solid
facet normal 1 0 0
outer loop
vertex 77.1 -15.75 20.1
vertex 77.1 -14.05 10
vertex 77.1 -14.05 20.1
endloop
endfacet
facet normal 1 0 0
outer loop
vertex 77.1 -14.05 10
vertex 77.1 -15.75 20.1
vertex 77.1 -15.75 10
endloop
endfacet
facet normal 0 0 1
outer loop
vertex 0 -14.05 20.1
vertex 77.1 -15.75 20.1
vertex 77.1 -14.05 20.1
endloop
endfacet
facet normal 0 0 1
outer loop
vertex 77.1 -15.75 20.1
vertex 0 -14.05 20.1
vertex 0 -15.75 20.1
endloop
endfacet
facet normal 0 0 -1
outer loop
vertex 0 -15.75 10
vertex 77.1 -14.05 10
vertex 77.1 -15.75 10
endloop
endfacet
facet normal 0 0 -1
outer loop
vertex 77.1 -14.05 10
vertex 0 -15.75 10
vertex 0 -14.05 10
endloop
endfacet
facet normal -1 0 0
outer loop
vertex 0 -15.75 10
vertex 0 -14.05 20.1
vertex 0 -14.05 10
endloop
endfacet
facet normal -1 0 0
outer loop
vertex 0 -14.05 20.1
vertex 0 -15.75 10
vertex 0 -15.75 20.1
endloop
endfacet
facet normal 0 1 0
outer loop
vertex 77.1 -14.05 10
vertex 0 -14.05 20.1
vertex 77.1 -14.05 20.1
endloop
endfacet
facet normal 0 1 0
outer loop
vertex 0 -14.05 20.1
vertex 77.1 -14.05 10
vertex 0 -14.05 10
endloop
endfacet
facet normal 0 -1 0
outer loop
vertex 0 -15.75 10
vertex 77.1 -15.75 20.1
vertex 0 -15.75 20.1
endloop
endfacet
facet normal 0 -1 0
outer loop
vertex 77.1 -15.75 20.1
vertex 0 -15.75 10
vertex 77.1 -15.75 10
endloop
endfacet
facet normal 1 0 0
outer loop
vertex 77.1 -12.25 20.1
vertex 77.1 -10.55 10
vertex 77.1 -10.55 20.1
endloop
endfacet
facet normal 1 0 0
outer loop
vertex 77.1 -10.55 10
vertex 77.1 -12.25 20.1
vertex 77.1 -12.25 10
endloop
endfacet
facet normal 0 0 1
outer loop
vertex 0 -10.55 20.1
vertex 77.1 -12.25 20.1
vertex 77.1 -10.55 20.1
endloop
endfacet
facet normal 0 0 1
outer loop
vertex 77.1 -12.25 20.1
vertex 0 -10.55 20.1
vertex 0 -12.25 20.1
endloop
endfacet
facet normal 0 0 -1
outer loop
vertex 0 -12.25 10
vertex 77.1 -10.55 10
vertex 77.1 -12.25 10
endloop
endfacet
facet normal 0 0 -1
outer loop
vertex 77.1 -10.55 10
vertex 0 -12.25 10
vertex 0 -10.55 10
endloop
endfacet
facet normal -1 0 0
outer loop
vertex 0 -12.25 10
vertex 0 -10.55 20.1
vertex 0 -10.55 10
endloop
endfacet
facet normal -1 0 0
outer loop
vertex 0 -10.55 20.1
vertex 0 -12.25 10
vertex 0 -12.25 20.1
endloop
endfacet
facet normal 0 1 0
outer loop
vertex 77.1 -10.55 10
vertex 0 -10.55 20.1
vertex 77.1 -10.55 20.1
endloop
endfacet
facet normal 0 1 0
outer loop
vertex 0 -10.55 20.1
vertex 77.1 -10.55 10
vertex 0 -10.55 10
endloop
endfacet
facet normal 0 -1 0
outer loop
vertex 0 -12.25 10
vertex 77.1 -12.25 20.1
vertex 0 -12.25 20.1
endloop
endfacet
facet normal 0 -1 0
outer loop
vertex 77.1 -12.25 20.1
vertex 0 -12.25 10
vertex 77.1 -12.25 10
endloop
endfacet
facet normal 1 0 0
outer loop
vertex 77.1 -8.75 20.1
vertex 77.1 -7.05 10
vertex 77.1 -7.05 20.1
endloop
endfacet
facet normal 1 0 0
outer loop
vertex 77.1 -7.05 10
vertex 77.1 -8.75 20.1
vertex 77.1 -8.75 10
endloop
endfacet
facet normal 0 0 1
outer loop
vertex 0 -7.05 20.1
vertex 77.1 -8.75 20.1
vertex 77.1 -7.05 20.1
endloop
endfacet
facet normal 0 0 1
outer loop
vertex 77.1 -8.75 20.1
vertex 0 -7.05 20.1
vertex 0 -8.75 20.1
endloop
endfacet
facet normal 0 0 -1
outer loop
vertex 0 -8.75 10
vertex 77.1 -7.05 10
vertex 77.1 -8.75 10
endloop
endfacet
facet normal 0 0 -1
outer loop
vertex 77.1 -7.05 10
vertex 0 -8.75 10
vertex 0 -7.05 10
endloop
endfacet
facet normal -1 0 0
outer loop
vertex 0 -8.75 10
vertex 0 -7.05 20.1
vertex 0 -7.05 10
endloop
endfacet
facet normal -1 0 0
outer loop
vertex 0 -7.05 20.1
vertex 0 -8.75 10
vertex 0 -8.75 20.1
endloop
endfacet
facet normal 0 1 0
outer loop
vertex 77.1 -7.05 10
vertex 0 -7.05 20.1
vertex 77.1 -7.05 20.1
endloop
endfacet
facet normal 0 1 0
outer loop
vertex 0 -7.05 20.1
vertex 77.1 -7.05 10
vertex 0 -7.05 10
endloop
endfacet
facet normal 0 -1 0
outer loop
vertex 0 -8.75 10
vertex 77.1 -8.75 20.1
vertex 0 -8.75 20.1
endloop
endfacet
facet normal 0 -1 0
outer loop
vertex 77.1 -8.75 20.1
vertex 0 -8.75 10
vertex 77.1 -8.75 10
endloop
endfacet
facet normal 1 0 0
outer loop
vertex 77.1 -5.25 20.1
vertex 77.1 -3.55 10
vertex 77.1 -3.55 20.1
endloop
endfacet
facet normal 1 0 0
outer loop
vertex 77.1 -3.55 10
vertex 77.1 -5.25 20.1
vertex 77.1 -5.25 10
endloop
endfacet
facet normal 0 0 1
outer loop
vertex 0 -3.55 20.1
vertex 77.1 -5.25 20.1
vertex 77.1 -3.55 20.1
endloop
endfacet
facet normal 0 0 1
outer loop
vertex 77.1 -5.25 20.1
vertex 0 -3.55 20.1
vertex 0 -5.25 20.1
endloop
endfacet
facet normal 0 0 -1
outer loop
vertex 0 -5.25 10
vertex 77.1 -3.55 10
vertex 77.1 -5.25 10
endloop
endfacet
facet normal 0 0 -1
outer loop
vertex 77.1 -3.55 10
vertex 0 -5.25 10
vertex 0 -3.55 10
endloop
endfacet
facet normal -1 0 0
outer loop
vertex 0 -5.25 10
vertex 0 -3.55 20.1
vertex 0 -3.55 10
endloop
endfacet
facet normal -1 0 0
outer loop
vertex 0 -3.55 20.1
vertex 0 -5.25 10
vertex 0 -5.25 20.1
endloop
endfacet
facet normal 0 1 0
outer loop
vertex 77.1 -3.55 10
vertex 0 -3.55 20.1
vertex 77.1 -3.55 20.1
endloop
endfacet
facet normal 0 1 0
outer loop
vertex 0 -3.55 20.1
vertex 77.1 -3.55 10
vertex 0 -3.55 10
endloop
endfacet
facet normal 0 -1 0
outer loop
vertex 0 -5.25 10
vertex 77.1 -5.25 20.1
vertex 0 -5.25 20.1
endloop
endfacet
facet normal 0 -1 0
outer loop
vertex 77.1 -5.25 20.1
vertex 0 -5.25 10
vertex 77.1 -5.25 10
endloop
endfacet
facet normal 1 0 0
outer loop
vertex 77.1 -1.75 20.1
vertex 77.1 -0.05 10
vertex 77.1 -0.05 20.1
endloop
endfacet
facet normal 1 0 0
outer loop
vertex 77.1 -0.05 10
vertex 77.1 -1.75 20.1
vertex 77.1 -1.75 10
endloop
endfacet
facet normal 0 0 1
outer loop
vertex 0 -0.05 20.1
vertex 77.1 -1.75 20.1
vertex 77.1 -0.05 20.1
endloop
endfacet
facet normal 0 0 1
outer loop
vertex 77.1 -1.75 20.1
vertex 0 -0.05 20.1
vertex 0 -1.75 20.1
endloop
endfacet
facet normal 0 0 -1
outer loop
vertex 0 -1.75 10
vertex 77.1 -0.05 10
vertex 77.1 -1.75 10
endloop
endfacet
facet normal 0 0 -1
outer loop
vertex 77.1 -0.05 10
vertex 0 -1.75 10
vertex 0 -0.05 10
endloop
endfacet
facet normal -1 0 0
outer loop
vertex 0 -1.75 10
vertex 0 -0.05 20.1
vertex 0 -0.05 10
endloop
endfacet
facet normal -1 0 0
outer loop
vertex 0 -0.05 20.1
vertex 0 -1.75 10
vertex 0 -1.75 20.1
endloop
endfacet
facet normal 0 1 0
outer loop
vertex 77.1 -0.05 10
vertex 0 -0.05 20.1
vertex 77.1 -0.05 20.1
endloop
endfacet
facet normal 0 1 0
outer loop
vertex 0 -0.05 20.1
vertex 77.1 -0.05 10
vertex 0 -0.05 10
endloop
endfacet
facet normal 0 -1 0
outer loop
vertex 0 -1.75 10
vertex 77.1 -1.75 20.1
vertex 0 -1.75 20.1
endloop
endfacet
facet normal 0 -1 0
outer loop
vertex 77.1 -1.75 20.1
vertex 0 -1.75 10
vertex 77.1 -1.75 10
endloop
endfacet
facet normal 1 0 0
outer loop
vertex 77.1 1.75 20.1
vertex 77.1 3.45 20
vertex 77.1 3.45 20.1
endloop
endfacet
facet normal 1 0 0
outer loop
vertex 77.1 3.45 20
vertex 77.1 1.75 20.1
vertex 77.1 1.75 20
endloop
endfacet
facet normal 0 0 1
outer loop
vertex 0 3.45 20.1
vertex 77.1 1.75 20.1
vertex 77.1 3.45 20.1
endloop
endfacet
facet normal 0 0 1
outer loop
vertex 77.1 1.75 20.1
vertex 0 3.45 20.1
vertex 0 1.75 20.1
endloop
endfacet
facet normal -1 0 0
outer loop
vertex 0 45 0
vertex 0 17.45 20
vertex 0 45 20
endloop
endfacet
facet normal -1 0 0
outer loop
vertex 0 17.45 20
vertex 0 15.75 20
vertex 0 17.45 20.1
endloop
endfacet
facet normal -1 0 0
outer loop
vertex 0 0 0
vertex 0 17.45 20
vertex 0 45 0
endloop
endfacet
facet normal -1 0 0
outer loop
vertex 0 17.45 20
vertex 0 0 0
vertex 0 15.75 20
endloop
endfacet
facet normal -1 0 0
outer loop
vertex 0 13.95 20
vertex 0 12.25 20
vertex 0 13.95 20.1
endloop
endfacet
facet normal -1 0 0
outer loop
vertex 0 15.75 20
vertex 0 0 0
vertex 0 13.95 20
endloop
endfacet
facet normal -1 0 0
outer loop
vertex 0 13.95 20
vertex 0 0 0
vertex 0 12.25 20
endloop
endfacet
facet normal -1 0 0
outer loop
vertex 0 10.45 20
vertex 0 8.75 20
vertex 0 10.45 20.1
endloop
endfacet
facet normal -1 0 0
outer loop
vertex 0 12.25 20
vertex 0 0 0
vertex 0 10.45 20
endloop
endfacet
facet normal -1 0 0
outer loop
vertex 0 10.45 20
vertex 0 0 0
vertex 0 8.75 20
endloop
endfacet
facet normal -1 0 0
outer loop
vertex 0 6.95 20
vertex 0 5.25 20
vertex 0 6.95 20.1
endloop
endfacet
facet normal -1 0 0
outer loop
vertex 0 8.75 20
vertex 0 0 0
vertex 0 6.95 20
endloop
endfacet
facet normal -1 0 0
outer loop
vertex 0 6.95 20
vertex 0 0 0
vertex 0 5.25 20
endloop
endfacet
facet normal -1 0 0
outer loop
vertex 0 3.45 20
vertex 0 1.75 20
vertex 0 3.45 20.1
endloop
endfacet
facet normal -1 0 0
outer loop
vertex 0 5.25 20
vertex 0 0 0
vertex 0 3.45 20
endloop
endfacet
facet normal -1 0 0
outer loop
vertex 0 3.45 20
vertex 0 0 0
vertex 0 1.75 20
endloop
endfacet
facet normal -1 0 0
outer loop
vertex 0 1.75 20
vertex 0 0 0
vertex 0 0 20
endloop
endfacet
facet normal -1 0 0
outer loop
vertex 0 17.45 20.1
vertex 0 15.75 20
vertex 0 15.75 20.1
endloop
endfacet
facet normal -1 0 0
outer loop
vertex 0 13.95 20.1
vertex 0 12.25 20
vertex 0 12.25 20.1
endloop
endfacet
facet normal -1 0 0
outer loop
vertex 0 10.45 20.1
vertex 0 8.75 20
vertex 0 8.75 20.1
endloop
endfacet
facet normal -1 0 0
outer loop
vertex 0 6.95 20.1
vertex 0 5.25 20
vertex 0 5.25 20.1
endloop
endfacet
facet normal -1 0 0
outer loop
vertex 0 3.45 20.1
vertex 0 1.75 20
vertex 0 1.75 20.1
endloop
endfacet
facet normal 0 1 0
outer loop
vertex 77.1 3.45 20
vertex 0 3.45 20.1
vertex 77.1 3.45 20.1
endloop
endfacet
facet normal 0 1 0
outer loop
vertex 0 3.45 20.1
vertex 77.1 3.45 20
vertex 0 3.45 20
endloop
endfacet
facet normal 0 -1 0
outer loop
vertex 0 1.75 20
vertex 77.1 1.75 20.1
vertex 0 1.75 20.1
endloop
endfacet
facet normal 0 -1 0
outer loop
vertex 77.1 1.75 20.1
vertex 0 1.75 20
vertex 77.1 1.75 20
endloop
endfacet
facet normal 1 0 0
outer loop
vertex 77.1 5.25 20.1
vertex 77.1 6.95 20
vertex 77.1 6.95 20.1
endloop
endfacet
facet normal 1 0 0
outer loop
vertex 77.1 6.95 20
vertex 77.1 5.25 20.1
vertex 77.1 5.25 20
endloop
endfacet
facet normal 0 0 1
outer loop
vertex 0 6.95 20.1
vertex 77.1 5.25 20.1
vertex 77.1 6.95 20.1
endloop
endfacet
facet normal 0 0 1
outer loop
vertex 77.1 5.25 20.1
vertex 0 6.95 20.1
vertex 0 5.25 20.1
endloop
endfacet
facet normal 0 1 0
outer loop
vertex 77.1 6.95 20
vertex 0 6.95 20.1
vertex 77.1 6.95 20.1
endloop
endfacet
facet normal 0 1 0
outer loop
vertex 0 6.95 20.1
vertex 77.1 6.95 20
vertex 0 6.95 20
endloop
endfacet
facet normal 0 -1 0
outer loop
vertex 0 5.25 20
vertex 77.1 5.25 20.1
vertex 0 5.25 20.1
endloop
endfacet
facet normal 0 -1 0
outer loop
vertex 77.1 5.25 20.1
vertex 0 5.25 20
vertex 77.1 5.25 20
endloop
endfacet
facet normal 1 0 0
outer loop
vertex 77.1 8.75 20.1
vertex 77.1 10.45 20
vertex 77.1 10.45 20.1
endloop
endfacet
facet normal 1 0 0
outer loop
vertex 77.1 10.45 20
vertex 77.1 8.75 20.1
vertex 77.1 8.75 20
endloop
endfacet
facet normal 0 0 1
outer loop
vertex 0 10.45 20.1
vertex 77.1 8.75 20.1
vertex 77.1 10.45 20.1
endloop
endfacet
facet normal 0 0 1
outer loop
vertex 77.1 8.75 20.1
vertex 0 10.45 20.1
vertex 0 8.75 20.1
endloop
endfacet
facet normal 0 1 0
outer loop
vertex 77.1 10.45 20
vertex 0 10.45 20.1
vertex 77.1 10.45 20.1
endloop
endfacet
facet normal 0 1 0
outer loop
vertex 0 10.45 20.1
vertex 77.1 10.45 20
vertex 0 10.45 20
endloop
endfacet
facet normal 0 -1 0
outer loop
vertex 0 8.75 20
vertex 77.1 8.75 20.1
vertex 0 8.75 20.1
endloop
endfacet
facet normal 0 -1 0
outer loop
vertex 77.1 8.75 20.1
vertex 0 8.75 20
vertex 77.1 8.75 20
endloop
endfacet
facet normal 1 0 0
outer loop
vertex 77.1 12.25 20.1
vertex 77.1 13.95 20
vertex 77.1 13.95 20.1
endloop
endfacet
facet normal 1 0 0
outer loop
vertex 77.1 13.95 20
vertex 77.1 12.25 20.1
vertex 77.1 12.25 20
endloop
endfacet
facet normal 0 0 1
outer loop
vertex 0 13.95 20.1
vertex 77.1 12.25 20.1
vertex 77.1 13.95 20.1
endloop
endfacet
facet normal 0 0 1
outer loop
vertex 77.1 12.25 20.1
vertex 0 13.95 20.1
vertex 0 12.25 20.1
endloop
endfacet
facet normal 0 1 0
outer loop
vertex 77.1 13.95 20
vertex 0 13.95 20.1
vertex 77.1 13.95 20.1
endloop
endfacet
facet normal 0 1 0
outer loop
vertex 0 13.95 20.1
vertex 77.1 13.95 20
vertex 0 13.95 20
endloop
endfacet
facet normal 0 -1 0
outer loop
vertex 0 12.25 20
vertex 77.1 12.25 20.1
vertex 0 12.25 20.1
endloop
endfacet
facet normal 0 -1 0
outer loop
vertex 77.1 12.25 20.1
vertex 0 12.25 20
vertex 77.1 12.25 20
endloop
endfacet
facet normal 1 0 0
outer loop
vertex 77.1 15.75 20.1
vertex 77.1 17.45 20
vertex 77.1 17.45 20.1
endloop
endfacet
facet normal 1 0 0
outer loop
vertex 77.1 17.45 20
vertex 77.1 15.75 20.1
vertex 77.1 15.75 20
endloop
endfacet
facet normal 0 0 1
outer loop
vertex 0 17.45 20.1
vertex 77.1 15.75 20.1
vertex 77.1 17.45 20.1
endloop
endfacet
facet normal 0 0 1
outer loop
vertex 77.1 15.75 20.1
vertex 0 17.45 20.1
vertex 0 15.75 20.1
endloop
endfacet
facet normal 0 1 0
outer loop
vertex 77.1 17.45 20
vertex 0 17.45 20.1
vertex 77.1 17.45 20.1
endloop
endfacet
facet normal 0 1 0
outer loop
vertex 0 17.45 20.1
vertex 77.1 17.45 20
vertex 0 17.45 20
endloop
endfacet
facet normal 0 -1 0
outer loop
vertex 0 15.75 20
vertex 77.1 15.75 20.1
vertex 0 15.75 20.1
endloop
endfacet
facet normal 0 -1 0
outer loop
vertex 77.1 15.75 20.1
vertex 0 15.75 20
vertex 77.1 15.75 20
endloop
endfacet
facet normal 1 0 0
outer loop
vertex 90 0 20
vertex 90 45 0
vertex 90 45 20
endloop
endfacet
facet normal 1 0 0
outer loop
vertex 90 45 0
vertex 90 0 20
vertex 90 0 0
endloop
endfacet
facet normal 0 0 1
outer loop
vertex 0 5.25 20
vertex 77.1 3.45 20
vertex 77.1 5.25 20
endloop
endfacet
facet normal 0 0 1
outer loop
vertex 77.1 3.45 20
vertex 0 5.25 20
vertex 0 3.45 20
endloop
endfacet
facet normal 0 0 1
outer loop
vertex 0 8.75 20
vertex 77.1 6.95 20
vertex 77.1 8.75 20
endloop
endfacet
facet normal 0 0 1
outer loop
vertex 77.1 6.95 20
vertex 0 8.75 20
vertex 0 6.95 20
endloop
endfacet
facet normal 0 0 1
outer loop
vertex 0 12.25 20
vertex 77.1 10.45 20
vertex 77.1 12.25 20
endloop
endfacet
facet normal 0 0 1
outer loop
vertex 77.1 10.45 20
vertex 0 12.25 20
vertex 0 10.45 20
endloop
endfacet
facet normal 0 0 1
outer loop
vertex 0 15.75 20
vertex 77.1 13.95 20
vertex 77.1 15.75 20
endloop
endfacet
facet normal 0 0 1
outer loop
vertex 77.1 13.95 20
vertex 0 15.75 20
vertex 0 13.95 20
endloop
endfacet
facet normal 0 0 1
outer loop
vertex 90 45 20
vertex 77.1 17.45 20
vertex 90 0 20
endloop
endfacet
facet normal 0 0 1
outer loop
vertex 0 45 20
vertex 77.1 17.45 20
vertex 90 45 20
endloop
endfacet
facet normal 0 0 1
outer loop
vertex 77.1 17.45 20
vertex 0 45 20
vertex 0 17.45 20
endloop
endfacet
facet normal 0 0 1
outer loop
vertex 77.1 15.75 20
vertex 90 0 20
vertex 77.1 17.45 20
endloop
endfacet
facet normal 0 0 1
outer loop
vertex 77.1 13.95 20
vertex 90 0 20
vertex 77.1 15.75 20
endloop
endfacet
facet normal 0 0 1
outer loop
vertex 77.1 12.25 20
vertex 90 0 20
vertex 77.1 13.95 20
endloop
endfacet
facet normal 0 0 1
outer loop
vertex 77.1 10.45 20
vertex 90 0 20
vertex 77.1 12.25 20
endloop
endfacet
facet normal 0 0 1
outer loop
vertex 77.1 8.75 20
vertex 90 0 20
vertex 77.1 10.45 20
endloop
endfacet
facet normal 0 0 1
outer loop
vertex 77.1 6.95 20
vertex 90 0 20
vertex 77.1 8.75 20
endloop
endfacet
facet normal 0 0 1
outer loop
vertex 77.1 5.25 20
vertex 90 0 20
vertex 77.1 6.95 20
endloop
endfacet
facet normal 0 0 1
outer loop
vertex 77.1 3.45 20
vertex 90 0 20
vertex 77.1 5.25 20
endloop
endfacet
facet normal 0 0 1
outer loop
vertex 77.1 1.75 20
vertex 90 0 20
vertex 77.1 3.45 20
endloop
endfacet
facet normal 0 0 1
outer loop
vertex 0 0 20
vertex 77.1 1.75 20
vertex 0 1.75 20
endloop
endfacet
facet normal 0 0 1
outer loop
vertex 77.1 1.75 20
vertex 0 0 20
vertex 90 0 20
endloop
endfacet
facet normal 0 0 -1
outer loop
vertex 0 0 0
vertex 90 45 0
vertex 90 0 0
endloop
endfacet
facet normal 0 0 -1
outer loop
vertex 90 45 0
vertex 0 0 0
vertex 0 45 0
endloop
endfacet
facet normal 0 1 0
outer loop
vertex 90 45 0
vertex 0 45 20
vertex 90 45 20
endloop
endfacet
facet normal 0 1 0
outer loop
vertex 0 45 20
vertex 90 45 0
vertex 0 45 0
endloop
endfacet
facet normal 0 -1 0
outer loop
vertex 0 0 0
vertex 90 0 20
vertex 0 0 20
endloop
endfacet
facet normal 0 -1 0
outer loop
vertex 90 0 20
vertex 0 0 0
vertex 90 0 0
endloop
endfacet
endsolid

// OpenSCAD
// Drying Rack for 10 Microscope Slides
// Base: 90 x 45 x 20 mm
// Slots: 10 parallel slots, 77mm long, 1.6mm wide, 10mm deep
// Spacing: 3.5mm centre-to-centre (Y)
// Orientation: Rests on XY plane at Z=0, builds upward (+Z)

// Base Dimensions
$base_length = 90;
$base_width = 45;
$base_height = 20;

// Slide Dimensions (for reference)
$slide_length = 75;
$slide_width = 25;
$slide_thickness = 1;

// Slot Dimensions
$num_slots = 10;
$slot_length = 77;
$slot_width = 1.6;
$slot_depth = 10;
$slot_spacing = 3.5; // Centre-to-centre in Y

// Extrusion quality for curved/rounded features
$fn = 64;

// Calculate slot positions
// The group of slots is centred on the block in X and Y.
// Since slots run along X, their X position is fixed at the center of the block.
// Their Y positions are calculated based on the total width and spacing.

// Total width occupied by the slots + gaps
// We need to center the entire array of 10 slots within the base width ($base_width).
// The distance from the center of the first slot to the center of the last slot is:
// (num_slots - 1) * slot_spacing
$offset_from_center = (($num_slots - 1) * $slot_spacing) / 2;

// Generate Y positions for the slots
// We iterate from -offset to +offset
for (i = [0 : $num_slots - 1]) {
    $y_pos = -($offset_from_center) + (i * $slot_spacing);
    
    // Define the slot geometry
    // The slot is a rectangular prism cut into the top face.
    // It runs along X (length $slot_length), is wide in Y ($slot_width), and deep in Z ($slot_depth).
    // Position: X is centered, Y is $y_pos, Z starts at $base_height - $slot_depth.
    
    translate([
        0, // X center
        $y_pos, // Y position
        $base_height - $slot_depth // Z start (bottom of the cut)
    ])
    difference() {
        // The cutting shape must extend slightly past the faces to ensure clean cuts
        // Extending 0.1mm in all directions
        cube([
            $slot_length + 0.1,
            $slot_width + 0.1,
            $slot_depth + 0.1
        ]);
    }
}

// Build the main solid block
translate([0, 0, 0])
cube([
    $base_length,
    $base_width,
    $base_height
]);
